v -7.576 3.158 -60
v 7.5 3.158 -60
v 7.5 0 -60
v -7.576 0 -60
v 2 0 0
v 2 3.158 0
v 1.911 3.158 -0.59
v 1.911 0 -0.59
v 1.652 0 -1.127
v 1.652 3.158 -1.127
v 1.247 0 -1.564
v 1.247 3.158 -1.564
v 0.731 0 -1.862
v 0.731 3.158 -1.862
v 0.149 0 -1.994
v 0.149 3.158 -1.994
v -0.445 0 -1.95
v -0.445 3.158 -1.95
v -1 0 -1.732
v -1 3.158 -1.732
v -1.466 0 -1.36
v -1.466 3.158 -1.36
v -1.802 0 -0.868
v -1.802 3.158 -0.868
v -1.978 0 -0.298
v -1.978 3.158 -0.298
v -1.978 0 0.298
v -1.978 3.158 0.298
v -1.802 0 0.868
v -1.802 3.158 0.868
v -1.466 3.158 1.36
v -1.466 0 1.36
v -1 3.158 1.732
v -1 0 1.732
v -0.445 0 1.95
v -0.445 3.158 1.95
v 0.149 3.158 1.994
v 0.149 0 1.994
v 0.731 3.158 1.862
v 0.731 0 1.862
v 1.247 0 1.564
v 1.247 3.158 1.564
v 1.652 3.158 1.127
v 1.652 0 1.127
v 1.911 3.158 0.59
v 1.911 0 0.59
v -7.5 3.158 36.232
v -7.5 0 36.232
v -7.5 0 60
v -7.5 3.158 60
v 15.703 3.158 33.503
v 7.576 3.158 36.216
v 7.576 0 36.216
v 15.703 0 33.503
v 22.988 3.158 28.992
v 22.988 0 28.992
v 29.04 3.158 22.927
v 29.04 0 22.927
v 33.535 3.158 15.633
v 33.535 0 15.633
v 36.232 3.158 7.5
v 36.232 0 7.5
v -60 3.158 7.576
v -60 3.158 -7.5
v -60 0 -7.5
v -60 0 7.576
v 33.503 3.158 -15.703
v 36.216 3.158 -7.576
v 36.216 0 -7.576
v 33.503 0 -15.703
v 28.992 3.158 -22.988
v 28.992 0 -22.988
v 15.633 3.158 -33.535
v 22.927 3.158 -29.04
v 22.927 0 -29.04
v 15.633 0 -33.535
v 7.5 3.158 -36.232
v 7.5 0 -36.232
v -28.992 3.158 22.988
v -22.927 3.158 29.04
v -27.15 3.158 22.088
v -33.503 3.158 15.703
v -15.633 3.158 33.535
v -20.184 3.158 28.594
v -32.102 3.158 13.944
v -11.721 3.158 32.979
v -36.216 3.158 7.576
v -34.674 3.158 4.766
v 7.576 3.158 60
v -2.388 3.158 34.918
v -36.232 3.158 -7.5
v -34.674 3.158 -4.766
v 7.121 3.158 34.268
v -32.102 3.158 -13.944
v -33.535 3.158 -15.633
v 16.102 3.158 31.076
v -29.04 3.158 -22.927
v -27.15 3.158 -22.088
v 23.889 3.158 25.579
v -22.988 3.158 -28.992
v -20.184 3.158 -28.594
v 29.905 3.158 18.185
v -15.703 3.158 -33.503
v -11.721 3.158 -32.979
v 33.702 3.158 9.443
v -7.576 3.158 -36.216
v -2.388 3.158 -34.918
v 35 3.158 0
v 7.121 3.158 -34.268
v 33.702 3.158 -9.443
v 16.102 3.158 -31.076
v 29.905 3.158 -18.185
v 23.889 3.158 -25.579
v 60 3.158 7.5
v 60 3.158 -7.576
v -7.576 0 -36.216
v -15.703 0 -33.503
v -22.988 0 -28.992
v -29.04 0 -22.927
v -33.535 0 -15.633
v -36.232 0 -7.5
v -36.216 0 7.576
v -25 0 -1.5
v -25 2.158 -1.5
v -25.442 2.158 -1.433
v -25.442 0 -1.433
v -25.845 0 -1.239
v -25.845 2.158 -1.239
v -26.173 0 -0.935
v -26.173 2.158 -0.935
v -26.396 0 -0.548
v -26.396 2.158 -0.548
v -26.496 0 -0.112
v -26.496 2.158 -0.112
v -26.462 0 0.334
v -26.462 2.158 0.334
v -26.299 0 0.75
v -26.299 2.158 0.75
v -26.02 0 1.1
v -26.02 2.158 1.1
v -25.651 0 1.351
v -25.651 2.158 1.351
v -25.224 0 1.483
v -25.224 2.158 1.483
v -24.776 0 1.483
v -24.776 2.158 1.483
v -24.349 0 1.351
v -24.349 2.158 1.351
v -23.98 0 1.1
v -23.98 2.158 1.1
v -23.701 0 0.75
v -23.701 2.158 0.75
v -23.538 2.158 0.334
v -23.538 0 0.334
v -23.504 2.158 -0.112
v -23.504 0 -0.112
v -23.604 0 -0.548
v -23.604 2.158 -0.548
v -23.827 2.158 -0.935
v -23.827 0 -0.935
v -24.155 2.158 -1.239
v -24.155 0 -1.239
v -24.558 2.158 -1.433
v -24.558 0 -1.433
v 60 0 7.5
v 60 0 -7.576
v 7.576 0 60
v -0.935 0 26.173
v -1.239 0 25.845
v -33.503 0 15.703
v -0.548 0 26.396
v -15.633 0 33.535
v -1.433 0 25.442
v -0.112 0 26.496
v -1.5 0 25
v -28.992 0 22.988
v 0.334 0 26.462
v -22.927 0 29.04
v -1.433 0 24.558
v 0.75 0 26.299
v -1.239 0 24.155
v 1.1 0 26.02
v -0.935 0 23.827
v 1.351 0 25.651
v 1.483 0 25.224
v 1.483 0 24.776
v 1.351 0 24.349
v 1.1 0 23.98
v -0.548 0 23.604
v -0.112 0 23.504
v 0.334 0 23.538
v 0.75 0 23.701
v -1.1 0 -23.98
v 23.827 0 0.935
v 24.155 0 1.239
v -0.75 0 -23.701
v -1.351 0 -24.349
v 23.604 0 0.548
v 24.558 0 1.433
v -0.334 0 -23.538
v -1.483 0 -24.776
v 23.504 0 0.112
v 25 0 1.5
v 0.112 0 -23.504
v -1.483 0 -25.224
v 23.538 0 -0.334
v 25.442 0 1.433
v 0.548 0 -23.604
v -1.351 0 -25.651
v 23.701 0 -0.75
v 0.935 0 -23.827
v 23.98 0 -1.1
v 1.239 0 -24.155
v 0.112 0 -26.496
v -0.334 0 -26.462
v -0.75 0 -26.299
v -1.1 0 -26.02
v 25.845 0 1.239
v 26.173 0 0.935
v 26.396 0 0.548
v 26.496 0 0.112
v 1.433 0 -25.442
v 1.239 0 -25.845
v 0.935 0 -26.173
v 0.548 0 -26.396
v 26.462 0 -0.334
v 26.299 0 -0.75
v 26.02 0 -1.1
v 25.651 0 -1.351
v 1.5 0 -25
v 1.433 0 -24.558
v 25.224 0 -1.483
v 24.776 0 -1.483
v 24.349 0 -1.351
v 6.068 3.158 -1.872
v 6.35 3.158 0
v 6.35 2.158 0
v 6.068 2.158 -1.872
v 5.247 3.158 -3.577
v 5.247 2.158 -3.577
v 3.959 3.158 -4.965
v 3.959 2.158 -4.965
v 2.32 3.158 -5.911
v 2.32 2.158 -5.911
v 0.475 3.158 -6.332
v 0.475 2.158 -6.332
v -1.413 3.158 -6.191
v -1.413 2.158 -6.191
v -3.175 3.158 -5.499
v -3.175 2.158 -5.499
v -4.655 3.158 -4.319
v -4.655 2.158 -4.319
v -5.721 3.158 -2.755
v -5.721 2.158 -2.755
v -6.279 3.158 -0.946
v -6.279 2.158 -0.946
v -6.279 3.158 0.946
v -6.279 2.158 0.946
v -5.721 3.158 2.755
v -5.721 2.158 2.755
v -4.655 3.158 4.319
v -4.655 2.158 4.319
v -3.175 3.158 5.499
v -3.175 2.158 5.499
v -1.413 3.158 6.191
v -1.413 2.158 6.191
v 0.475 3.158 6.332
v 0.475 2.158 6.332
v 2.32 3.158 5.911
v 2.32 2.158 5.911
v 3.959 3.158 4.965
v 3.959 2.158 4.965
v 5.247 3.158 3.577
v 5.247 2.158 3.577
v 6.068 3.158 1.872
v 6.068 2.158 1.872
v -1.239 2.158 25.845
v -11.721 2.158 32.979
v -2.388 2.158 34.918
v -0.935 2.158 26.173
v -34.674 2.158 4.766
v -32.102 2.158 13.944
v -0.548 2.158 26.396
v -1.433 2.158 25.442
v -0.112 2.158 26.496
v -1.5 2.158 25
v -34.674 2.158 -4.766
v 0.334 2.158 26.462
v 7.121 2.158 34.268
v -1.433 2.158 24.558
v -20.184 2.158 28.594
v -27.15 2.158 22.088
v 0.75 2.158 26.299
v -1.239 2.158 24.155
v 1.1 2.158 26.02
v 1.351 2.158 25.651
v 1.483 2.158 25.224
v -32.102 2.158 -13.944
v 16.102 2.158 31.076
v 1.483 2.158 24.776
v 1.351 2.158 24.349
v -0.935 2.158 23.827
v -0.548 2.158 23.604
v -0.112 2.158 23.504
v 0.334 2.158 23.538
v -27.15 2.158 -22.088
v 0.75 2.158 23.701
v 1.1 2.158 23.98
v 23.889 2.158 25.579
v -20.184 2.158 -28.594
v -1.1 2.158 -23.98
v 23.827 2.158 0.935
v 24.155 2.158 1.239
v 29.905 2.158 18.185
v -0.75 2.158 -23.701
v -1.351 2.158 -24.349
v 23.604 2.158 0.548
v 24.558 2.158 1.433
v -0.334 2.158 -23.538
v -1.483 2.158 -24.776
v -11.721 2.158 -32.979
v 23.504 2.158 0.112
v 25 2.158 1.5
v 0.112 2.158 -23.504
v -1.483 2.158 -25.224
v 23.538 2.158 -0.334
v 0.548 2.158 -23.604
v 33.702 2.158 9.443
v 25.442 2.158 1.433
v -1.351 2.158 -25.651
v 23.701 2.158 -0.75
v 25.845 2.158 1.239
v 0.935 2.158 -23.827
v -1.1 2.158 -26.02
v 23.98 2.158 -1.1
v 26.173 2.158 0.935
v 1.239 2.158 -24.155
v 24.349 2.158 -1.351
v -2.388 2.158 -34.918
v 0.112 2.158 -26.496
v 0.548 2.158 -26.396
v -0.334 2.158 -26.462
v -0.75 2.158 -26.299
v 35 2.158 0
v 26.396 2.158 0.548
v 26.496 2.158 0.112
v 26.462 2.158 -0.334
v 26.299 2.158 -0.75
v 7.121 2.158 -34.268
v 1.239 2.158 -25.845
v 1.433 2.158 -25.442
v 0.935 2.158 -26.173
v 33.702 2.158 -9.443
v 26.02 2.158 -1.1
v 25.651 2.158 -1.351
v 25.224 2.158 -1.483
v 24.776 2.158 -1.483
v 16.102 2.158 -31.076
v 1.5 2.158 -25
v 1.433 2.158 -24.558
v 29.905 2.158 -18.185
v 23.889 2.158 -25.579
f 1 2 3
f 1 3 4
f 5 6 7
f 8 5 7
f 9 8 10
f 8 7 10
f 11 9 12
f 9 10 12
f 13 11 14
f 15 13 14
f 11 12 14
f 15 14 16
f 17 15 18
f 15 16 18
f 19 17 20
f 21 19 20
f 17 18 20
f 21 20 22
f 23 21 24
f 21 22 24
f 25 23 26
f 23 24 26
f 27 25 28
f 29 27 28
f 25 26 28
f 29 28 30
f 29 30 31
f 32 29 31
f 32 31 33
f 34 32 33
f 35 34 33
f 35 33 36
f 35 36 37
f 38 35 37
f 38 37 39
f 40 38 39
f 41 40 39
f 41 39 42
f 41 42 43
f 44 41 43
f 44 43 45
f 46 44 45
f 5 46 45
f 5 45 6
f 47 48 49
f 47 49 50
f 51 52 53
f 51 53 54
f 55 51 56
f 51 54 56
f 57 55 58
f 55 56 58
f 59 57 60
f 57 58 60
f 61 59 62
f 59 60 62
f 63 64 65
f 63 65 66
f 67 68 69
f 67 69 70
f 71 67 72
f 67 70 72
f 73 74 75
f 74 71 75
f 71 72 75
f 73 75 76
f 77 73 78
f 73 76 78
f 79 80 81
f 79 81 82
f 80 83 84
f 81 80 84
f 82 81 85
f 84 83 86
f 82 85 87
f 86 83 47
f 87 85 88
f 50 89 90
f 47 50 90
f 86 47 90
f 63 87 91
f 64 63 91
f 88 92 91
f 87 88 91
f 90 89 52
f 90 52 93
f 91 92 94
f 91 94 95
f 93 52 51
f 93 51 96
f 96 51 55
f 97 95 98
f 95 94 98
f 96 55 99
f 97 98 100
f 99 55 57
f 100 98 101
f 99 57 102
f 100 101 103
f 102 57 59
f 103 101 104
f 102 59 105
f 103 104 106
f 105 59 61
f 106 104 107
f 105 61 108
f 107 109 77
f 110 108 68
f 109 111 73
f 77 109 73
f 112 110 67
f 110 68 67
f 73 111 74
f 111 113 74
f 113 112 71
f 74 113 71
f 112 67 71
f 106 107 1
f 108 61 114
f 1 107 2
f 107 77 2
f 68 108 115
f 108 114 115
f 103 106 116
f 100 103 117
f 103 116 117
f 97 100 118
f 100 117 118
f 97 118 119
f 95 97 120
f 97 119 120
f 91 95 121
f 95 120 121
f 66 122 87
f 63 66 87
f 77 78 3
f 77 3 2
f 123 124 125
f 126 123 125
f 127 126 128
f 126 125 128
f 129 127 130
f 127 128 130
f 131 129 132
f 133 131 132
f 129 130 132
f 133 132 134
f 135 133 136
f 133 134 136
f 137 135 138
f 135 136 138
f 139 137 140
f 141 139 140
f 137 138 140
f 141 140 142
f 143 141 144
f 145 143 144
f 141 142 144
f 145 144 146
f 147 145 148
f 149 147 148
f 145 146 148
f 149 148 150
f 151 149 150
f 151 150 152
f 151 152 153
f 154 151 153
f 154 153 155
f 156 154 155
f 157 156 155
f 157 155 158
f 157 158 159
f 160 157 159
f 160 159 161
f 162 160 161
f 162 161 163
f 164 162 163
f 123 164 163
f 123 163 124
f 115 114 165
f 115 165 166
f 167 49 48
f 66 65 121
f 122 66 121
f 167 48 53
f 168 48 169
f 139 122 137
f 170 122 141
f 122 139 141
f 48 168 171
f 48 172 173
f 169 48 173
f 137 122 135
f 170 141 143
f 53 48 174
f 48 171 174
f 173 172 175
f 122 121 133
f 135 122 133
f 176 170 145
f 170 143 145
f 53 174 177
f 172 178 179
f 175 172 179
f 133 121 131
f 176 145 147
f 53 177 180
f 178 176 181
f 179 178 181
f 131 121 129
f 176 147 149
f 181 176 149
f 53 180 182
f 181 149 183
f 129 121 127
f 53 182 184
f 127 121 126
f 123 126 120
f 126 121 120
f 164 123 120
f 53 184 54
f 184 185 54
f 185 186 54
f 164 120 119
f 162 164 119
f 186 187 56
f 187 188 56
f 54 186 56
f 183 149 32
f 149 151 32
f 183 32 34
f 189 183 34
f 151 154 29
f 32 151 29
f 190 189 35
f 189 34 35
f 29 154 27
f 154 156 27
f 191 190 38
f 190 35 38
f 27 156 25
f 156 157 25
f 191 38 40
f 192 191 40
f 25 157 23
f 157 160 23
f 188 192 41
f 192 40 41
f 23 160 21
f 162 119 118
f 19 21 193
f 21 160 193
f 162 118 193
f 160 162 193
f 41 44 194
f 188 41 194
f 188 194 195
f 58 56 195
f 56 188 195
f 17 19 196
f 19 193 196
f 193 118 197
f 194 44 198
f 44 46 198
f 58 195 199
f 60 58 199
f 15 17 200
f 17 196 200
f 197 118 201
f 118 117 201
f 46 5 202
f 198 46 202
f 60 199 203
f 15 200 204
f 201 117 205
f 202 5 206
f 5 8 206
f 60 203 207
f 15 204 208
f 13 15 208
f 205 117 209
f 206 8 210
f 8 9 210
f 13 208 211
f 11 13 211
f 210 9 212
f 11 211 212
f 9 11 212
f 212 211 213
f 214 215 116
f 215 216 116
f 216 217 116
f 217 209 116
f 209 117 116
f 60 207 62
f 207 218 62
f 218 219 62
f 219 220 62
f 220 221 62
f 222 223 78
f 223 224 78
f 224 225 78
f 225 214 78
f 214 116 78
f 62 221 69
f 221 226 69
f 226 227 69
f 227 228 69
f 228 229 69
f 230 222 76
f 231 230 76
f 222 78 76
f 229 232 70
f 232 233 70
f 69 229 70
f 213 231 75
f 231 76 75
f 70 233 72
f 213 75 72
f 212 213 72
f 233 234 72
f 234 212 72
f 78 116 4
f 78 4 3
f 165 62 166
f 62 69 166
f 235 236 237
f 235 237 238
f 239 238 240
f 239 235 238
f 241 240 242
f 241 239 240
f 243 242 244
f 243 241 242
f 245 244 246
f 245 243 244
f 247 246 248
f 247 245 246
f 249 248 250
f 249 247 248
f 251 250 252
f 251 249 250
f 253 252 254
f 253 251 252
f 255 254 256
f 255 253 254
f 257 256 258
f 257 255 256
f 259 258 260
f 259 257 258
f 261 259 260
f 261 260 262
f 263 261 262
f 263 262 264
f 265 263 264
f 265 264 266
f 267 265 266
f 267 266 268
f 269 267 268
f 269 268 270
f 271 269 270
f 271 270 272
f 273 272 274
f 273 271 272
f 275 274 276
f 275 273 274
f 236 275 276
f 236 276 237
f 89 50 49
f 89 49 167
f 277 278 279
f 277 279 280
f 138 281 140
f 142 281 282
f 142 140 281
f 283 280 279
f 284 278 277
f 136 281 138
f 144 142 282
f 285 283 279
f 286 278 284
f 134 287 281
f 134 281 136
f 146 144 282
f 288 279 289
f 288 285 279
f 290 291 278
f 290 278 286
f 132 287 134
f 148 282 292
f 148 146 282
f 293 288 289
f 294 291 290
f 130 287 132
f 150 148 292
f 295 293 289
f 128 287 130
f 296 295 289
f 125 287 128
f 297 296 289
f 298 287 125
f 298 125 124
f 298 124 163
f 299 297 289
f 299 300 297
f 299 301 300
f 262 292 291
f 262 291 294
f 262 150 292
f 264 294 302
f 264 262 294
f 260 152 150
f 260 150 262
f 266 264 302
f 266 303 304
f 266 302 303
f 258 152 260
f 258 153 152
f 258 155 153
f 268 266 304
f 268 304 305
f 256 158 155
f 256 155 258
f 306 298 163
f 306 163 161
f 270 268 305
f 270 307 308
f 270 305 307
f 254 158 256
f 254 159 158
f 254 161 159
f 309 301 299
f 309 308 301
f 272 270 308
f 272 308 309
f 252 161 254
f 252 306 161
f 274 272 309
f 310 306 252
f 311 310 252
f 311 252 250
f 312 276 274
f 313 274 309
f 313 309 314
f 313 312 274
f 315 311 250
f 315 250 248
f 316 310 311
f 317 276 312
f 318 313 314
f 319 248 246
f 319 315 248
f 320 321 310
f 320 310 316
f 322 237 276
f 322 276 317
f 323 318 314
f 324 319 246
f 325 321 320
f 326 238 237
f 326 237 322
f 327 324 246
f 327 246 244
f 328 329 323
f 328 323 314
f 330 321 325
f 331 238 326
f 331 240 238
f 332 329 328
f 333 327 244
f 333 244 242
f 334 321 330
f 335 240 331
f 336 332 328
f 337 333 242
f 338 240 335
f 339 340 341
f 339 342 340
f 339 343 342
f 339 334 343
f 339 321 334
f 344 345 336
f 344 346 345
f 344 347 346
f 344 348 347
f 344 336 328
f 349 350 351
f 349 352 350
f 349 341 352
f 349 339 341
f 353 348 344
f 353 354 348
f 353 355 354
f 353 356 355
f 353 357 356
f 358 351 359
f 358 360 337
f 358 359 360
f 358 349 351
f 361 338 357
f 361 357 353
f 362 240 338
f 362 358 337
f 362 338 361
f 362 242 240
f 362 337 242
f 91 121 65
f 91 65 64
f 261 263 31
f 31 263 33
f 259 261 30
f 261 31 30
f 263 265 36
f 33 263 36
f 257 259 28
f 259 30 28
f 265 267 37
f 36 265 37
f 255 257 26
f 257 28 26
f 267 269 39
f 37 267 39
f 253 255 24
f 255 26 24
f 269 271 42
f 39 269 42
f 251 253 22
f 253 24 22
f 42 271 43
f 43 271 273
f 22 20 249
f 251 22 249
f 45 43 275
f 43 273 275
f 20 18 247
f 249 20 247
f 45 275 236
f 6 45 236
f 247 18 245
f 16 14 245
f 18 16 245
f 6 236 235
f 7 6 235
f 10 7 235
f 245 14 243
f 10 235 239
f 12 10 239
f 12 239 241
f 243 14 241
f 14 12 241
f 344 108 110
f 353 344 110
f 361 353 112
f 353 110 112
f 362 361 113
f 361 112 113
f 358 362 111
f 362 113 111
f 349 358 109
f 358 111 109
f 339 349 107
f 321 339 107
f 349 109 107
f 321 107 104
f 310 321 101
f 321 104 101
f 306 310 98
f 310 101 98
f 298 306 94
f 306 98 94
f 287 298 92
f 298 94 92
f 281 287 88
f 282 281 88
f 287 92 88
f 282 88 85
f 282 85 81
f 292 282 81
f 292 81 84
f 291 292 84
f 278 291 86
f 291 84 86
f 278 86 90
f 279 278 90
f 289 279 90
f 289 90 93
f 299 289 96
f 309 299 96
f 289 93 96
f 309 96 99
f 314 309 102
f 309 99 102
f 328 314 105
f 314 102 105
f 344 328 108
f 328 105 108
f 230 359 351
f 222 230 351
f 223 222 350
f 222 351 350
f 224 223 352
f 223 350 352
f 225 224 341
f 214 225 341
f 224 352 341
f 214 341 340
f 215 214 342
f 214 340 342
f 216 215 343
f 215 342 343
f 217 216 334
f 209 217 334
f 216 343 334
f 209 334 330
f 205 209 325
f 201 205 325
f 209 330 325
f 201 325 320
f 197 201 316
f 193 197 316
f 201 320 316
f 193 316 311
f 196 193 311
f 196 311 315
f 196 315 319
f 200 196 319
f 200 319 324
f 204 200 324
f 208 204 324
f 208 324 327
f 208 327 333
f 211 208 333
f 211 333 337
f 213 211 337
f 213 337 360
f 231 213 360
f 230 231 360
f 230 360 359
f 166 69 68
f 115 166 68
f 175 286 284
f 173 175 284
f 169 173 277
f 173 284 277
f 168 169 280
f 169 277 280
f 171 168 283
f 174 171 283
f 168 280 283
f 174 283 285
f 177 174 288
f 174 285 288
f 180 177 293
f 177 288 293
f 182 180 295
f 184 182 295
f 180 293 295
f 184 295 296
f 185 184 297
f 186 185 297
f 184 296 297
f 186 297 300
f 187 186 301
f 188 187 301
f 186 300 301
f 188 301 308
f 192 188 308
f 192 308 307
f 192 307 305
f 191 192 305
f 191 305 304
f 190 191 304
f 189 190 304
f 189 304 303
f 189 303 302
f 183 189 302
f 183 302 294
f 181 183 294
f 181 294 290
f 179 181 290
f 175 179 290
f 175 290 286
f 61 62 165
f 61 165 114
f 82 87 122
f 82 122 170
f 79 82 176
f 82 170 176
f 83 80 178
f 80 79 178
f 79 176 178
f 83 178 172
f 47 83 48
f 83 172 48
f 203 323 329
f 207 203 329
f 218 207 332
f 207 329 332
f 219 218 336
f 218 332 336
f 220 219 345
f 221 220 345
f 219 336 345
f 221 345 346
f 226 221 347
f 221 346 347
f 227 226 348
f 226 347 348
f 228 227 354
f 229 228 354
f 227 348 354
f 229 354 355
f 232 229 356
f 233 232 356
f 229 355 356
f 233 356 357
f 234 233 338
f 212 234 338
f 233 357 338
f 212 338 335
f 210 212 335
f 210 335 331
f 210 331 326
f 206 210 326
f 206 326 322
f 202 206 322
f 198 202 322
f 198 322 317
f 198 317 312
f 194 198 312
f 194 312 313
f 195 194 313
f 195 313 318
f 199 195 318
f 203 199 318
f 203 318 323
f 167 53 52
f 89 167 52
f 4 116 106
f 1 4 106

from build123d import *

# Parameters (mm, degrees)
SKETCH1_R           = 37
BOSS_EXTRUDE1_DEPTH = 3.158172797
SKETCH13_W          = 7.575673387
SKETCH13_H          = 3.158172797
SKETCH13_W_2        = 7.5
BOSS_EXTRUDE2_DEPTH = 60
CIRPATTERN1_COUNT   = 4
SKETCH2_R           = 35
SKETCH2_R_2         = 6.35
CUT_EXTRUDE1_DEPTH  = 1
SKETCH17_R          = 2
CUT_EXTRUDE2_DEPTH  = 10
SKETCH19_R          = 1.5
CUT_EXTRUDE3_DEPTH  = 10
CIRPATTERN2_COUNT   = 4


with BuildPart() as part:
    # Sketch1 → Boss-Extrude1 (new body)
    with BuildSketch(Plane(origin=(0, 0, 0), x_dir=(1, 0, 0), z_dir=(0, 1, 0))):
        Circle(SKETCH1_R)
    extrude(amount=BOSS_EXTRUDE1_DEPTH)

    # Sketch13 → Boss-Extrude2 (add)
    with BuildSketch(Plane.XY):
        with Locations((3.787836694, 1.579086399)):
            Rectangle(SKETCH13_W, SKETCH13_H)
        with Locations((-3.75, 1.579086399)):
            Rectangle(SKETCH13_W_2, SKETCH13_H)
    boss_extrude2 = extrude(amount=BOSS_EXTRUDE2_DEPTH)

    # CirPattern1: Boss-Extrude2 ×4 about axis
    cirpattern1_axis = Axis((0, 3.316081437, 0), (0, -1, 0))
    for i in range(1, CIRPATTERN1_COUNT):
        add(boss_extrude2.rotate(cirpattern1_axis, i * 360 / CIRPATTERN1_COUNT))

    # Sketch2 → Cut-Extrude1 (cut)
    with BuildSketch(Plane(origin=(0, 3.158172797, 0), x_dir=(1, 0, 0), z_dir=(0, 1, 0))):
        Circle(SKETCH2_R)
        Circle(SKETCH2_R_2, mode=Mode.SUBTRACT)
    extrude(amount=-CUT_EXTRUDE1_DEPTH, mode=Mode.SUBTRACT)

    # Sketch17 → Cut-Extrude2 (cut)
    with BuildSketch(Plane(origin=(0, 3.158172797, 0), x_dir=(1, 0, 0), z_dir=(0, 1, 0))):
        Circle(SKETCH17_R)
    extrude(amount=-CUT_EXTRUDE2_DEPTH, mode=Mode.SUBTRACT)

    # Sketch19 → Cut-Extrude3 (cut)
    with BuildSketch(Plane(origin=(0, 3.158172797, 0), x_dir=(1, 0, 0), z_dir=(0, 1, 0))):
        with Locations((0, 25)):
            Circle(SKETCH19_R)
    cut_extrude3 = extrude(amount=-CUT_EXTRUDE3_DEPTH, mode=Mode.SUBTRACT)

    # CirPattern2: Cut-Extrude3 ×4 about axis
    cirpattern2_axis = Axis((0, 3.316081437, 0), (0, -1, 0))
    for i in range(1, CIRPATTERN2_COUNT):
        add(cut_extrude3.rotate(cirpattern2_axis, i * 360 / CIRPATTERN2_COUNT), mode=Mode.SUBTRACT)


solid = part.part
